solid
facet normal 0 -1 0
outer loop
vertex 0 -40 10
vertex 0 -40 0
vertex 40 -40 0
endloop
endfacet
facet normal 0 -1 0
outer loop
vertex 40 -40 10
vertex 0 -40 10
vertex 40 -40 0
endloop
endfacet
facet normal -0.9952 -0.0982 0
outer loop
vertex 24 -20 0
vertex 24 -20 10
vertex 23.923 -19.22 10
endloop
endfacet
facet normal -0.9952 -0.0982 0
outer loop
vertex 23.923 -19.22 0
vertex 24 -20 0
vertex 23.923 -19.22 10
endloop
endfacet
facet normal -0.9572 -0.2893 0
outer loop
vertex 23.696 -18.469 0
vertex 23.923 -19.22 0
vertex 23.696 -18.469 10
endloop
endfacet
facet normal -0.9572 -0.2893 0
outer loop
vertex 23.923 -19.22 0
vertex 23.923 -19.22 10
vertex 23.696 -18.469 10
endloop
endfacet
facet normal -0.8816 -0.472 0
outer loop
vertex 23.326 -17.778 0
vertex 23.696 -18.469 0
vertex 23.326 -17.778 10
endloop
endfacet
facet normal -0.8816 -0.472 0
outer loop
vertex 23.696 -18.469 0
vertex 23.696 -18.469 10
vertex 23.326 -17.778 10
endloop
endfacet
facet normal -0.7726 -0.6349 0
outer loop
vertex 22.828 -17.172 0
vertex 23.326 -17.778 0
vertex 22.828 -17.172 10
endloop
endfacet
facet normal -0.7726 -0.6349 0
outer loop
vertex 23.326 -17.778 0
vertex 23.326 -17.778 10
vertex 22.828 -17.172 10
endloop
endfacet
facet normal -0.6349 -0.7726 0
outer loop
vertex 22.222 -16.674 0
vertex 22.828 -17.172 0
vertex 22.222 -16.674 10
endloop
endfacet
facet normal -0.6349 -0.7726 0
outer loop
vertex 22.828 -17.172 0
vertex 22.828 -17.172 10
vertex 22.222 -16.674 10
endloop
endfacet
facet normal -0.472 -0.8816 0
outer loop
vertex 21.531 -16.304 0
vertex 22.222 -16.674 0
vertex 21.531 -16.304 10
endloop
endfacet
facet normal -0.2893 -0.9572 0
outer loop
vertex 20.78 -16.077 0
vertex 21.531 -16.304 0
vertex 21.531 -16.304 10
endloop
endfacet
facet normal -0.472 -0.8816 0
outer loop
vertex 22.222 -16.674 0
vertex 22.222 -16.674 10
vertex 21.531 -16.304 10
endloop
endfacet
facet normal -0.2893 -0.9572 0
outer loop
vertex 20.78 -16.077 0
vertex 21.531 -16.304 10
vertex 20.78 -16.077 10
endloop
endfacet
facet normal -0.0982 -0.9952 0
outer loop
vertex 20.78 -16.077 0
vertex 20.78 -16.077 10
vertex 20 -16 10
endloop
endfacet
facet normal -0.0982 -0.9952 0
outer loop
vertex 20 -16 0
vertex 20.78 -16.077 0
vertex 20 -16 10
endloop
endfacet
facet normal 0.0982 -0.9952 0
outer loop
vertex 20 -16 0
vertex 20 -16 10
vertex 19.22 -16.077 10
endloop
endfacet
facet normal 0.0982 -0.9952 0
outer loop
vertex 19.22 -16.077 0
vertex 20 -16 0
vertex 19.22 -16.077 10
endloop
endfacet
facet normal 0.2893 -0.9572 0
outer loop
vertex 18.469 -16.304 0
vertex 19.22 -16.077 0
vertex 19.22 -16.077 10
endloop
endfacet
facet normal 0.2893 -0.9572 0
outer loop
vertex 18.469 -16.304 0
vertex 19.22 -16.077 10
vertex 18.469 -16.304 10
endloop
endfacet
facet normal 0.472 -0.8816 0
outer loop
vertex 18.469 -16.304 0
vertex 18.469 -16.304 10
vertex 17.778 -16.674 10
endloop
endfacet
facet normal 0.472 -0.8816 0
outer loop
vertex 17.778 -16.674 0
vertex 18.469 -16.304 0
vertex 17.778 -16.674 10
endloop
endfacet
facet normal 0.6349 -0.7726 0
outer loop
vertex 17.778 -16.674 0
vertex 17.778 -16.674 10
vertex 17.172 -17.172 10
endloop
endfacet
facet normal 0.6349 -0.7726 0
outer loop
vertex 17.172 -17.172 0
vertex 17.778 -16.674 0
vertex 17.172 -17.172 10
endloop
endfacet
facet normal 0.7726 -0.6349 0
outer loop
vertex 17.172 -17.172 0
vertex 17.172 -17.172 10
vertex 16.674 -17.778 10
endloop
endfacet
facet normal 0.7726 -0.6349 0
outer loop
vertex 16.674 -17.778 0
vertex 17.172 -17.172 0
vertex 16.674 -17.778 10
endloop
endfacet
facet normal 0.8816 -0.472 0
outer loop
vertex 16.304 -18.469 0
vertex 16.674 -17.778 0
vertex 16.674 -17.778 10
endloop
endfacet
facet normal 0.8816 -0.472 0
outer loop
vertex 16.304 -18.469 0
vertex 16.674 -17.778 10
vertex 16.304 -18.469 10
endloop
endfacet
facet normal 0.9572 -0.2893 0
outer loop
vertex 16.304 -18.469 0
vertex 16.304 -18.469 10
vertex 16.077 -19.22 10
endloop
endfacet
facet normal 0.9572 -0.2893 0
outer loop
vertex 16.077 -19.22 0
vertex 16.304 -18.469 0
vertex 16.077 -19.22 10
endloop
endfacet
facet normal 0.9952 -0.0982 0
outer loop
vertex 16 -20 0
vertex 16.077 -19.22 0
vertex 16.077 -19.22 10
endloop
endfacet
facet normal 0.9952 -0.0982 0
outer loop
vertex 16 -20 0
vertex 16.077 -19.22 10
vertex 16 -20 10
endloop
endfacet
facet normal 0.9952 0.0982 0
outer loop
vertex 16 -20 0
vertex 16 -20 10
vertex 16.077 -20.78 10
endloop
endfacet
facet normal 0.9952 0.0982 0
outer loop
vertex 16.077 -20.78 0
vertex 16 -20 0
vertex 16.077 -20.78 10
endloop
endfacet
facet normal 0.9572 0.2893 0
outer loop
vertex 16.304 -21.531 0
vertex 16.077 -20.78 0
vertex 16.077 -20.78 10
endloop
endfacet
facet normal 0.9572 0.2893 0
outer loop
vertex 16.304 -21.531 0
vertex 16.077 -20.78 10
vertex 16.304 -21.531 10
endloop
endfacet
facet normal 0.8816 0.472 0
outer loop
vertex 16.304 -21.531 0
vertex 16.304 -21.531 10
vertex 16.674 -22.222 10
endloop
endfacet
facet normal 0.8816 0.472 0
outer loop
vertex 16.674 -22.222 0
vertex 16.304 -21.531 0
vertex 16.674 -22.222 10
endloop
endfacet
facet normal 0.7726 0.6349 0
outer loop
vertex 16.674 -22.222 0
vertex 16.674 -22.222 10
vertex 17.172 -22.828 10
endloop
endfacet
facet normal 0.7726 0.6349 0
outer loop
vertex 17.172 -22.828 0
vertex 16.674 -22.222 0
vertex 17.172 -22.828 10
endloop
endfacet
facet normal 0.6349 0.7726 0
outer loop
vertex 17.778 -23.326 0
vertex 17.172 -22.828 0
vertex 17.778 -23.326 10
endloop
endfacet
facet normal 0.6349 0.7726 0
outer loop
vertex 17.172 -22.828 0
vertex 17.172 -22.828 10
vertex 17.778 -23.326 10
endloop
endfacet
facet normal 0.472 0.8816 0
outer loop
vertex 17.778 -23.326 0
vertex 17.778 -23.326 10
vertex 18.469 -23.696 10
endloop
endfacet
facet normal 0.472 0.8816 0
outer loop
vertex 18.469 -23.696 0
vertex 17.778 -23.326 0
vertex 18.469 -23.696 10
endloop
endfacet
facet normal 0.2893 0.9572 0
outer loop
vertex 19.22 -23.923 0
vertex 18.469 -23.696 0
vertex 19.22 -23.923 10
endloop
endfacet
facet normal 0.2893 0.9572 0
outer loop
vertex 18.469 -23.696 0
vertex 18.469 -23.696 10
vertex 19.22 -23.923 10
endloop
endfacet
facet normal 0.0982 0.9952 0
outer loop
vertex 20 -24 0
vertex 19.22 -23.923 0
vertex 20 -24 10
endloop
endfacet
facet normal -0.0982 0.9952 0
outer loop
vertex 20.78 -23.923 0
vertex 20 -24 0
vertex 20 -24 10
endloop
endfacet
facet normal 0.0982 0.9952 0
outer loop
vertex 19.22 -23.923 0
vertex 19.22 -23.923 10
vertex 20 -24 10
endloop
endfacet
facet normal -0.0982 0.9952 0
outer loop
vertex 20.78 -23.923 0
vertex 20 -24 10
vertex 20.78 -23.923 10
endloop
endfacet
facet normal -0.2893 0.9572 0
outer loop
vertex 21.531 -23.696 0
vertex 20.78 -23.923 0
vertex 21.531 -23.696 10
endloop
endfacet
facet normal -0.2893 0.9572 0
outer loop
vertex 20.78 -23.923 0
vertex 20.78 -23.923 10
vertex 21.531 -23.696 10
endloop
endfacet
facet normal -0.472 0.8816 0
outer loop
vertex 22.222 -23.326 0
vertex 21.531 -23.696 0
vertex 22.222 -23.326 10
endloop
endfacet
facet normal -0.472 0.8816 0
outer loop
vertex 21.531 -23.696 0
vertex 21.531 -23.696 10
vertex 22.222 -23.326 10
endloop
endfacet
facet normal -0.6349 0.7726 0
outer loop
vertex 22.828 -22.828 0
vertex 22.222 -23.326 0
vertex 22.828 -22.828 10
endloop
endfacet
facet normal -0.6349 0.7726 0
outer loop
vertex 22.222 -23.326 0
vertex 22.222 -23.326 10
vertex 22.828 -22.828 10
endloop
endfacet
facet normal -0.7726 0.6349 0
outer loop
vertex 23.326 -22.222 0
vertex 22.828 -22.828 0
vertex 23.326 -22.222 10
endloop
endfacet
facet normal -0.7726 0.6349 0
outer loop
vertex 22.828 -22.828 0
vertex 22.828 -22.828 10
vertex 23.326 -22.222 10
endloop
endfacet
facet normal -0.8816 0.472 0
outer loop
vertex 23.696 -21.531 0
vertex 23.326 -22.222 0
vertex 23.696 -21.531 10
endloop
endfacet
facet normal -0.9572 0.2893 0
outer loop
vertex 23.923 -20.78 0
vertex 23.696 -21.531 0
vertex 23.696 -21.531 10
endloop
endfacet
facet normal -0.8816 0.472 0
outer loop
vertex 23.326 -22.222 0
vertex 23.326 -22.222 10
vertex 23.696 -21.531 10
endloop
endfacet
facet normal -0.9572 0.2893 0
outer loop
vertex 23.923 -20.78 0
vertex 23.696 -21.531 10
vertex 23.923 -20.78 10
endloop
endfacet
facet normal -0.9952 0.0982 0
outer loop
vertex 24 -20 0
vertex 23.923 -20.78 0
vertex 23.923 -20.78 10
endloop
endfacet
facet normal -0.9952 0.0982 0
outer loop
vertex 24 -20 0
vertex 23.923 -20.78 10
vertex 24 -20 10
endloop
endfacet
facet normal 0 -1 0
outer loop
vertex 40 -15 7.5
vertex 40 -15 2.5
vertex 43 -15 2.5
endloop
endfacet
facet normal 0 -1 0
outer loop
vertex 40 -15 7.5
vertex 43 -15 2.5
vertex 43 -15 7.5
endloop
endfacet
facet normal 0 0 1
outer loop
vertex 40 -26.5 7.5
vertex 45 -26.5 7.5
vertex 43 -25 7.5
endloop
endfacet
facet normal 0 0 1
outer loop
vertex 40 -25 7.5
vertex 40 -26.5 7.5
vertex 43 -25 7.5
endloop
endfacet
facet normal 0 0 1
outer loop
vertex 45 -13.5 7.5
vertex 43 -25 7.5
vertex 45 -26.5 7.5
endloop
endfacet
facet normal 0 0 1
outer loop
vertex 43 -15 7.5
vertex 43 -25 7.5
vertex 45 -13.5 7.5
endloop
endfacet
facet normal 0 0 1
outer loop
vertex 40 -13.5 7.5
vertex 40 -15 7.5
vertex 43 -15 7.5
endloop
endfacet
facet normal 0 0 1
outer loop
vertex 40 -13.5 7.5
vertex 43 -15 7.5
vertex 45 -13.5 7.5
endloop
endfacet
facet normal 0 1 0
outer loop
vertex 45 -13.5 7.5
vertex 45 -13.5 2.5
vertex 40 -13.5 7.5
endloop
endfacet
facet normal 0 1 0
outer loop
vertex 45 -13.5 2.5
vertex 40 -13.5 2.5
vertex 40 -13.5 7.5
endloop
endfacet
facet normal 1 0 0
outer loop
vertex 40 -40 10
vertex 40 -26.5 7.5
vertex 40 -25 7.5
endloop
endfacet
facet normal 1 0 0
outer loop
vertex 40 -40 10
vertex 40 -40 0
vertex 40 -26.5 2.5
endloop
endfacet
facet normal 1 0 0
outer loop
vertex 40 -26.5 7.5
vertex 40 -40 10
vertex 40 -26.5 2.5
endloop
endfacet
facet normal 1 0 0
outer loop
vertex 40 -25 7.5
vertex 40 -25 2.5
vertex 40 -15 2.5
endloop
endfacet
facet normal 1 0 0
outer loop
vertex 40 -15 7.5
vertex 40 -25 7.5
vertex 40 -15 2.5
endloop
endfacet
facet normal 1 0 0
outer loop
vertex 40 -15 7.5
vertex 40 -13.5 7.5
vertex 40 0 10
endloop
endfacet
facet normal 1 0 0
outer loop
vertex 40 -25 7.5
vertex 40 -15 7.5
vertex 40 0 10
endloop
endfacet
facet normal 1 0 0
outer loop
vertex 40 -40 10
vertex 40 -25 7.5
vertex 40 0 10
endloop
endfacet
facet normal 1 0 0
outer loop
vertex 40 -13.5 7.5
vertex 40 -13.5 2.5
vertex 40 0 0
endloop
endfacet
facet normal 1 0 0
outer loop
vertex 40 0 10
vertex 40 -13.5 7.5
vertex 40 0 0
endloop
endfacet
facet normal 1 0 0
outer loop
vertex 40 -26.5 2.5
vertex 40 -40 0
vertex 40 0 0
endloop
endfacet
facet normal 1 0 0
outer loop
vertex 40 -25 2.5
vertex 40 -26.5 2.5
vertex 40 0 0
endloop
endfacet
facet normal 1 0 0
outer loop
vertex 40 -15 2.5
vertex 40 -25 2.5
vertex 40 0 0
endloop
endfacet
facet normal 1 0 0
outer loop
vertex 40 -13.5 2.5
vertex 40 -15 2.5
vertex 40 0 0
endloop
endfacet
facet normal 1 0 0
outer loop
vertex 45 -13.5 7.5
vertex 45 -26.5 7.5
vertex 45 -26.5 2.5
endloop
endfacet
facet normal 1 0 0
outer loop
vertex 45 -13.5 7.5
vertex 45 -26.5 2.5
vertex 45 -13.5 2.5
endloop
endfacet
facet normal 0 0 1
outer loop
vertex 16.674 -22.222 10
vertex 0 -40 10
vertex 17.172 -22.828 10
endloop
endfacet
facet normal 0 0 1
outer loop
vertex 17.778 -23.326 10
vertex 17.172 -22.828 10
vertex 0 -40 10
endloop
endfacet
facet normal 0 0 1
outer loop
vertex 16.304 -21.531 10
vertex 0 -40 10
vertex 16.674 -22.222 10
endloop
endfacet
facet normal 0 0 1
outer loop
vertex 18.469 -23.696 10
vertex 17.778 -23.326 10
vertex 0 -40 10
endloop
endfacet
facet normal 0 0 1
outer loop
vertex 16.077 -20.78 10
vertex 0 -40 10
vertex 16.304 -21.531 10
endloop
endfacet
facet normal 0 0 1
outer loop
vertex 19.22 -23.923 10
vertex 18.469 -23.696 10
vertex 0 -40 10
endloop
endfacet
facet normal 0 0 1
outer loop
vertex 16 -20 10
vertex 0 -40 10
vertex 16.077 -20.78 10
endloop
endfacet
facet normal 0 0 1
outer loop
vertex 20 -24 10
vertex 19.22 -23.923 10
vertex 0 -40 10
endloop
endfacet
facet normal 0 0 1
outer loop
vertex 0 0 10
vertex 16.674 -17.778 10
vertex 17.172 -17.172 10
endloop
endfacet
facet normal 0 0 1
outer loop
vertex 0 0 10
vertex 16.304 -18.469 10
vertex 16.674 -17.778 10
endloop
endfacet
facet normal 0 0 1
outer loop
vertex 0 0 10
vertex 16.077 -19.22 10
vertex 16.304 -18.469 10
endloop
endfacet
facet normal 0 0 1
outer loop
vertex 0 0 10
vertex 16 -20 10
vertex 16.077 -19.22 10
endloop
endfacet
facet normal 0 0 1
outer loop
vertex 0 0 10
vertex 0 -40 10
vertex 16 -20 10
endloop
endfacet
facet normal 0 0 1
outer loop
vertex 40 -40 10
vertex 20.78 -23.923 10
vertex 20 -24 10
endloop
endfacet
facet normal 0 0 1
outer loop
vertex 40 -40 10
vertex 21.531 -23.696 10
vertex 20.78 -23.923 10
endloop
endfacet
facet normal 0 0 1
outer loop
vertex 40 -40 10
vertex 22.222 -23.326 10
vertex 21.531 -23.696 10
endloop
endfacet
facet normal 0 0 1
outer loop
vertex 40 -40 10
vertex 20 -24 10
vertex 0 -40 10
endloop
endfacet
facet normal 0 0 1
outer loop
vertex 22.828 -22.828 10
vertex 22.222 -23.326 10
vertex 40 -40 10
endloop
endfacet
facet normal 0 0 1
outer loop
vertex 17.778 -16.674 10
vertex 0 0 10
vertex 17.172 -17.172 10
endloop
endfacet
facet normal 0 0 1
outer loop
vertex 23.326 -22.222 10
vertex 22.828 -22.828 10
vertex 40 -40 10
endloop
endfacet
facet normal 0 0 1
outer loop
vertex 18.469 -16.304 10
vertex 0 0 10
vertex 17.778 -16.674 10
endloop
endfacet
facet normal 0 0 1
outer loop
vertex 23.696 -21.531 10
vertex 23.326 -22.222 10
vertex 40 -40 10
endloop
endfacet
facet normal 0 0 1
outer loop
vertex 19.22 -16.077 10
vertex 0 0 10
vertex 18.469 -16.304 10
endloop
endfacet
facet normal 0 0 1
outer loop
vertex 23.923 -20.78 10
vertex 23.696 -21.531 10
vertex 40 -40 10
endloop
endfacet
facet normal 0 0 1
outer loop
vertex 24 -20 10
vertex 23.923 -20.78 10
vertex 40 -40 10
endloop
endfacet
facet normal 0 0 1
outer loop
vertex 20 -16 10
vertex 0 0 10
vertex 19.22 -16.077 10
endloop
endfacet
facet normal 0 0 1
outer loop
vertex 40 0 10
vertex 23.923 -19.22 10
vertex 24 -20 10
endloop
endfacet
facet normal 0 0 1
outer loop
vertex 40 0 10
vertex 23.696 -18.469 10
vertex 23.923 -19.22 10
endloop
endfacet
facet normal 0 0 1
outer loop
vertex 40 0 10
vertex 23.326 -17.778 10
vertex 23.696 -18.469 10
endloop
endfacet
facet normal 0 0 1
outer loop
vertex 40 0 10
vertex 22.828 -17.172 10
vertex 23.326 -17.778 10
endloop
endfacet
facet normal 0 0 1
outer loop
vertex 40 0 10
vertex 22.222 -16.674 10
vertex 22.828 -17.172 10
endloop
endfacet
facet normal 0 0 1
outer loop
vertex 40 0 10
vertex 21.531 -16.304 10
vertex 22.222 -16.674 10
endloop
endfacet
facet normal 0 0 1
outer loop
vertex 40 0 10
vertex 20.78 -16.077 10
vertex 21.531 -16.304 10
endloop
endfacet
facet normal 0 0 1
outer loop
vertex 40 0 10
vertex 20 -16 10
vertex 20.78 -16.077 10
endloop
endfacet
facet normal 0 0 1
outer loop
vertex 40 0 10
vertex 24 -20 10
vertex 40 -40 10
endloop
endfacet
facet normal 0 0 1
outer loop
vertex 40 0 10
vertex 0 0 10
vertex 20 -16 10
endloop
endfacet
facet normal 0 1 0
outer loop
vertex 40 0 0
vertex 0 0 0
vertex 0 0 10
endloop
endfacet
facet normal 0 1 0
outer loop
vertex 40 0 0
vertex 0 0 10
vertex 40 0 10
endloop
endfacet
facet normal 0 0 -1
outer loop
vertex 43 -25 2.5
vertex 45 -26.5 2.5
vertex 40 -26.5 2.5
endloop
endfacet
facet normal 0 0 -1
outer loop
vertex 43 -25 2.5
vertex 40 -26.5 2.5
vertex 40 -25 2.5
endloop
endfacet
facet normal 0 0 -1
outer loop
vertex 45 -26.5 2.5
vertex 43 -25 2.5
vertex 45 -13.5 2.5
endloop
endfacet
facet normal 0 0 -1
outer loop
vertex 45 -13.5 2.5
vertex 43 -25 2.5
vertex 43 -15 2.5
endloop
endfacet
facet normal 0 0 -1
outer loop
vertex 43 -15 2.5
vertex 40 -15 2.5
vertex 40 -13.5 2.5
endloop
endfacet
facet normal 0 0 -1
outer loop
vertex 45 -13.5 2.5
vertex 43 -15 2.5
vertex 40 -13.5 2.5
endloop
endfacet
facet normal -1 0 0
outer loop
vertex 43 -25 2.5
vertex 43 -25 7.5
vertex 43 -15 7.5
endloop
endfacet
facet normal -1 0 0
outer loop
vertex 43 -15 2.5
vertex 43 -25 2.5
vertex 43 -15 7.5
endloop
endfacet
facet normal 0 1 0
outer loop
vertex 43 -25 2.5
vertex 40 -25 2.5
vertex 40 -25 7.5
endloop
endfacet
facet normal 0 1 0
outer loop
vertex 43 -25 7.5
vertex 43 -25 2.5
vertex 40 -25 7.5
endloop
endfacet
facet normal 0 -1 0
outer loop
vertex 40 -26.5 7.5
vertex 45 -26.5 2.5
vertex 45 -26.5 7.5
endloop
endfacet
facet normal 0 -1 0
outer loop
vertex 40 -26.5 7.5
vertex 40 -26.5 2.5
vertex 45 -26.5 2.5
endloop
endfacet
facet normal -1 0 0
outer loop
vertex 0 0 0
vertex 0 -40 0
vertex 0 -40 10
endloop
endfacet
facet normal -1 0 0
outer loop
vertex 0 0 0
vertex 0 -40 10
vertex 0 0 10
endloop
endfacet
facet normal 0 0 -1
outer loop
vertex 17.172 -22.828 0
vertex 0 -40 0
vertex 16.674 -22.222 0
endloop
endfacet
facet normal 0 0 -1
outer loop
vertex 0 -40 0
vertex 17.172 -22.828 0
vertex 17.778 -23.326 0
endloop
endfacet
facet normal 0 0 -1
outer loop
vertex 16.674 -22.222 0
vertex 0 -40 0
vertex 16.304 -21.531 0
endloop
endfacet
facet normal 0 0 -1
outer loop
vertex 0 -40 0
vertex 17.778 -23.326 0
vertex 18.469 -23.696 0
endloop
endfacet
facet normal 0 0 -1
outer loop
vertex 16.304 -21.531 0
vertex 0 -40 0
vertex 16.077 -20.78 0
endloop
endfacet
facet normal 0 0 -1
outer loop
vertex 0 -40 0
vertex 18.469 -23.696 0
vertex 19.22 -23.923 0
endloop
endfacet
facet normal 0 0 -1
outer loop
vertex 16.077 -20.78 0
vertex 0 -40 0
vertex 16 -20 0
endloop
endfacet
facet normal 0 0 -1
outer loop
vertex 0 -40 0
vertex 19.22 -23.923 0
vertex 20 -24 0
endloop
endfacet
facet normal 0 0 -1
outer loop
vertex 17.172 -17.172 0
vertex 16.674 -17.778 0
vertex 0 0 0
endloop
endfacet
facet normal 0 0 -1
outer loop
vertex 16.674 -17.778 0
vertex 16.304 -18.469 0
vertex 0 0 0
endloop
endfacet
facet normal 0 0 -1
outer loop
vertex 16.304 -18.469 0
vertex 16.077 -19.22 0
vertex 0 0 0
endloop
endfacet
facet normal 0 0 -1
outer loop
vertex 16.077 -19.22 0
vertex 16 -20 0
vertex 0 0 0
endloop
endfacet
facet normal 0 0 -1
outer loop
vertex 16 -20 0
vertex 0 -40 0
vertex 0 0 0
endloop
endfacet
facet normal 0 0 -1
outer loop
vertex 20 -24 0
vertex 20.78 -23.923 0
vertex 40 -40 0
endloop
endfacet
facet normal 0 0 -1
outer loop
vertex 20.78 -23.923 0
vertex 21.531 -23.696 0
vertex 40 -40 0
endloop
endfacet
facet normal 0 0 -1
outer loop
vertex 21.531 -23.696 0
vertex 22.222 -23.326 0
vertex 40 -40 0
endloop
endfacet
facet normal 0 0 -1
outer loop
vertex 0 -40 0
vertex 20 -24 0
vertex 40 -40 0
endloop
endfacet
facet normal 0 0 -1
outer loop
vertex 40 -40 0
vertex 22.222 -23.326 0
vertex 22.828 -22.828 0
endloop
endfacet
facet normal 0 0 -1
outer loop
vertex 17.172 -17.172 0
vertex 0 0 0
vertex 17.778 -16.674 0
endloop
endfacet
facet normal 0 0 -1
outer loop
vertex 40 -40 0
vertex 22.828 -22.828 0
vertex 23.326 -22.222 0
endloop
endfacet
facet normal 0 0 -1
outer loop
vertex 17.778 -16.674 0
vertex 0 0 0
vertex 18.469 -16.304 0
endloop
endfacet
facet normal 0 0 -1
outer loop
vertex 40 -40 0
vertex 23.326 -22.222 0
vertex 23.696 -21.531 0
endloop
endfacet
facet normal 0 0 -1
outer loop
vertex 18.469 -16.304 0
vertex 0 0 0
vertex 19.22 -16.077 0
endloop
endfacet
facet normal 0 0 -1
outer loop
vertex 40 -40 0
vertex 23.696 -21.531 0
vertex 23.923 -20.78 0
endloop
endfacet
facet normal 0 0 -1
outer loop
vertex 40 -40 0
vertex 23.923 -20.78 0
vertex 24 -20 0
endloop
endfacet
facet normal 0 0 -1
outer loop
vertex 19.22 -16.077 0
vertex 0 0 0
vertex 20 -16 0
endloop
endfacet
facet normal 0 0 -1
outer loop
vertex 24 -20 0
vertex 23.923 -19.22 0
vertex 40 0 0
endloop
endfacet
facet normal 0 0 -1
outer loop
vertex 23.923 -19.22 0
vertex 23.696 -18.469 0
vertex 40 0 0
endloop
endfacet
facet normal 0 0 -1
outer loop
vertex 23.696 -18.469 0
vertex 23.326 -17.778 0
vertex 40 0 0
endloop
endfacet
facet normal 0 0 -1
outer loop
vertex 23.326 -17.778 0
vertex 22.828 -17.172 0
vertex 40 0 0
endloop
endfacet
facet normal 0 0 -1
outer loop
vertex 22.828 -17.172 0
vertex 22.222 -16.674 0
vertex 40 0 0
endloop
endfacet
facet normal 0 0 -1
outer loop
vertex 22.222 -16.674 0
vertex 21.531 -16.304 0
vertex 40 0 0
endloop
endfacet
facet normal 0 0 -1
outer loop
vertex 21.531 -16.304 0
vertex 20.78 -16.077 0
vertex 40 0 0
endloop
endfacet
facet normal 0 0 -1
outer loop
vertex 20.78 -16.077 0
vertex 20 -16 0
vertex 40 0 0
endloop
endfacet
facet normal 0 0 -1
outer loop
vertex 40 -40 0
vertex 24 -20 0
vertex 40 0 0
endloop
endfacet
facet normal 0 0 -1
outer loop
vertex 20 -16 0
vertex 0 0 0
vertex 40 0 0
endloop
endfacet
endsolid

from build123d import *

# Parameters (mm, degrees)
F0_W     = 40
F0_H     = 40
F1_DEPTH = 10
F2_R     = 4
F3_DEPTH = 10.001
F4_W     = 1.5
F4_H     = 5
F5_DEPTH = 3
F6_W     = 13
F6_H     = 5
F7_DEPTH = 2


with BuildPart() as f1:
    # F0 (on Top) → F1 (new body)
    with BuildSketch(Plane.XY):
        with Locations((20, -20)):
            Rectangle(F0_W, F0_H)
    extrude(amount=F1_DEPTH)

    # F2 (on face) → F3 (cut, through all)
    with BuildSketch(Plane.XY.offset(10)):
        with Locations((20, -20)):
            Circle(F2_R)
    extrude(amount=-F3_DEPTH, mode=Mode.SUBTRACT)

    # F4 (on face) → F5 (join)
    with BuildSketch(Plane.YZ.offset(40)):
        with Locations((-25.75, 5)):
            Rectangle(F4_W, F4_H)
        with Locations((-14.25, 5)):
            Rectangle(F4_W, F4_H)
    extrude(amount=F5_DEPTH)

    # F6 (on face) → F7 (join)
    with BuildSketch(Plane.YZ.offset(43)):
        with Locations((-20, 5)):
            Rectangle(F6_W, F6_H)
    extrude(amount=F7_DEPTH)


solid = f1.part
